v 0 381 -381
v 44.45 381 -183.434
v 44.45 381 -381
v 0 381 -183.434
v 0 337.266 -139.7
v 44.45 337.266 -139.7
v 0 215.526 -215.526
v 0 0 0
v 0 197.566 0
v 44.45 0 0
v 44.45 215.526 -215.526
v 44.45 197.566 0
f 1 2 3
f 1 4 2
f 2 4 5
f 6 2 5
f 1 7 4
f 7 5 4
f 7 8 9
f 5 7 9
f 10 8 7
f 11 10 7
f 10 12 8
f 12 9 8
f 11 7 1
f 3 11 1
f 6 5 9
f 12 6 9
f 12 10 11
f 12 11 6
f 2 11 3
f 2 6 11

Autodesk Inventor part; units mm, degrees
ref_plane "YZ Plane" through (0, 0, 0) normal (1, 0, 0) x (0, 1, 0)
ref_plane "XZ Plane" through (0, 0, 0) normal (0, 1, 0) x (-1, 0, 0)
ref_plane "XY Plane" through (0, 0, 0) normal (0, 0, 1) x (1, 0, 0)
sketch "Sketch1" plane through (0, 0, 0) normal (1, 0, 0) x (0, 1, 0)
  line L0 (0, 0) -> (215.5261, -215.5261)
  line L1 (0, 0) -> (304.8, 0) construction
  line L2 (381, -183.4344) -> (337.2656, -139.7)
  line L3 (337.2656, -139.7) -> (197.5656, 0)
  line L4 (197.5656, 0) -> (0, 0)
  line L5 (215.5261, -215.5261) -> (381, -381)
  line L6 (381, -183.4344) -> (381, -381)
  dimension "d0" = 304.8
  dimension "d1" = 45
  dimension "d2" = 139.7
  dimension "d5" = 381
extrude "Extrusion1" add sketch "Sketch1" along normal blind 44.45
properties part number "gableSupport" material "Wood (Birch)"
